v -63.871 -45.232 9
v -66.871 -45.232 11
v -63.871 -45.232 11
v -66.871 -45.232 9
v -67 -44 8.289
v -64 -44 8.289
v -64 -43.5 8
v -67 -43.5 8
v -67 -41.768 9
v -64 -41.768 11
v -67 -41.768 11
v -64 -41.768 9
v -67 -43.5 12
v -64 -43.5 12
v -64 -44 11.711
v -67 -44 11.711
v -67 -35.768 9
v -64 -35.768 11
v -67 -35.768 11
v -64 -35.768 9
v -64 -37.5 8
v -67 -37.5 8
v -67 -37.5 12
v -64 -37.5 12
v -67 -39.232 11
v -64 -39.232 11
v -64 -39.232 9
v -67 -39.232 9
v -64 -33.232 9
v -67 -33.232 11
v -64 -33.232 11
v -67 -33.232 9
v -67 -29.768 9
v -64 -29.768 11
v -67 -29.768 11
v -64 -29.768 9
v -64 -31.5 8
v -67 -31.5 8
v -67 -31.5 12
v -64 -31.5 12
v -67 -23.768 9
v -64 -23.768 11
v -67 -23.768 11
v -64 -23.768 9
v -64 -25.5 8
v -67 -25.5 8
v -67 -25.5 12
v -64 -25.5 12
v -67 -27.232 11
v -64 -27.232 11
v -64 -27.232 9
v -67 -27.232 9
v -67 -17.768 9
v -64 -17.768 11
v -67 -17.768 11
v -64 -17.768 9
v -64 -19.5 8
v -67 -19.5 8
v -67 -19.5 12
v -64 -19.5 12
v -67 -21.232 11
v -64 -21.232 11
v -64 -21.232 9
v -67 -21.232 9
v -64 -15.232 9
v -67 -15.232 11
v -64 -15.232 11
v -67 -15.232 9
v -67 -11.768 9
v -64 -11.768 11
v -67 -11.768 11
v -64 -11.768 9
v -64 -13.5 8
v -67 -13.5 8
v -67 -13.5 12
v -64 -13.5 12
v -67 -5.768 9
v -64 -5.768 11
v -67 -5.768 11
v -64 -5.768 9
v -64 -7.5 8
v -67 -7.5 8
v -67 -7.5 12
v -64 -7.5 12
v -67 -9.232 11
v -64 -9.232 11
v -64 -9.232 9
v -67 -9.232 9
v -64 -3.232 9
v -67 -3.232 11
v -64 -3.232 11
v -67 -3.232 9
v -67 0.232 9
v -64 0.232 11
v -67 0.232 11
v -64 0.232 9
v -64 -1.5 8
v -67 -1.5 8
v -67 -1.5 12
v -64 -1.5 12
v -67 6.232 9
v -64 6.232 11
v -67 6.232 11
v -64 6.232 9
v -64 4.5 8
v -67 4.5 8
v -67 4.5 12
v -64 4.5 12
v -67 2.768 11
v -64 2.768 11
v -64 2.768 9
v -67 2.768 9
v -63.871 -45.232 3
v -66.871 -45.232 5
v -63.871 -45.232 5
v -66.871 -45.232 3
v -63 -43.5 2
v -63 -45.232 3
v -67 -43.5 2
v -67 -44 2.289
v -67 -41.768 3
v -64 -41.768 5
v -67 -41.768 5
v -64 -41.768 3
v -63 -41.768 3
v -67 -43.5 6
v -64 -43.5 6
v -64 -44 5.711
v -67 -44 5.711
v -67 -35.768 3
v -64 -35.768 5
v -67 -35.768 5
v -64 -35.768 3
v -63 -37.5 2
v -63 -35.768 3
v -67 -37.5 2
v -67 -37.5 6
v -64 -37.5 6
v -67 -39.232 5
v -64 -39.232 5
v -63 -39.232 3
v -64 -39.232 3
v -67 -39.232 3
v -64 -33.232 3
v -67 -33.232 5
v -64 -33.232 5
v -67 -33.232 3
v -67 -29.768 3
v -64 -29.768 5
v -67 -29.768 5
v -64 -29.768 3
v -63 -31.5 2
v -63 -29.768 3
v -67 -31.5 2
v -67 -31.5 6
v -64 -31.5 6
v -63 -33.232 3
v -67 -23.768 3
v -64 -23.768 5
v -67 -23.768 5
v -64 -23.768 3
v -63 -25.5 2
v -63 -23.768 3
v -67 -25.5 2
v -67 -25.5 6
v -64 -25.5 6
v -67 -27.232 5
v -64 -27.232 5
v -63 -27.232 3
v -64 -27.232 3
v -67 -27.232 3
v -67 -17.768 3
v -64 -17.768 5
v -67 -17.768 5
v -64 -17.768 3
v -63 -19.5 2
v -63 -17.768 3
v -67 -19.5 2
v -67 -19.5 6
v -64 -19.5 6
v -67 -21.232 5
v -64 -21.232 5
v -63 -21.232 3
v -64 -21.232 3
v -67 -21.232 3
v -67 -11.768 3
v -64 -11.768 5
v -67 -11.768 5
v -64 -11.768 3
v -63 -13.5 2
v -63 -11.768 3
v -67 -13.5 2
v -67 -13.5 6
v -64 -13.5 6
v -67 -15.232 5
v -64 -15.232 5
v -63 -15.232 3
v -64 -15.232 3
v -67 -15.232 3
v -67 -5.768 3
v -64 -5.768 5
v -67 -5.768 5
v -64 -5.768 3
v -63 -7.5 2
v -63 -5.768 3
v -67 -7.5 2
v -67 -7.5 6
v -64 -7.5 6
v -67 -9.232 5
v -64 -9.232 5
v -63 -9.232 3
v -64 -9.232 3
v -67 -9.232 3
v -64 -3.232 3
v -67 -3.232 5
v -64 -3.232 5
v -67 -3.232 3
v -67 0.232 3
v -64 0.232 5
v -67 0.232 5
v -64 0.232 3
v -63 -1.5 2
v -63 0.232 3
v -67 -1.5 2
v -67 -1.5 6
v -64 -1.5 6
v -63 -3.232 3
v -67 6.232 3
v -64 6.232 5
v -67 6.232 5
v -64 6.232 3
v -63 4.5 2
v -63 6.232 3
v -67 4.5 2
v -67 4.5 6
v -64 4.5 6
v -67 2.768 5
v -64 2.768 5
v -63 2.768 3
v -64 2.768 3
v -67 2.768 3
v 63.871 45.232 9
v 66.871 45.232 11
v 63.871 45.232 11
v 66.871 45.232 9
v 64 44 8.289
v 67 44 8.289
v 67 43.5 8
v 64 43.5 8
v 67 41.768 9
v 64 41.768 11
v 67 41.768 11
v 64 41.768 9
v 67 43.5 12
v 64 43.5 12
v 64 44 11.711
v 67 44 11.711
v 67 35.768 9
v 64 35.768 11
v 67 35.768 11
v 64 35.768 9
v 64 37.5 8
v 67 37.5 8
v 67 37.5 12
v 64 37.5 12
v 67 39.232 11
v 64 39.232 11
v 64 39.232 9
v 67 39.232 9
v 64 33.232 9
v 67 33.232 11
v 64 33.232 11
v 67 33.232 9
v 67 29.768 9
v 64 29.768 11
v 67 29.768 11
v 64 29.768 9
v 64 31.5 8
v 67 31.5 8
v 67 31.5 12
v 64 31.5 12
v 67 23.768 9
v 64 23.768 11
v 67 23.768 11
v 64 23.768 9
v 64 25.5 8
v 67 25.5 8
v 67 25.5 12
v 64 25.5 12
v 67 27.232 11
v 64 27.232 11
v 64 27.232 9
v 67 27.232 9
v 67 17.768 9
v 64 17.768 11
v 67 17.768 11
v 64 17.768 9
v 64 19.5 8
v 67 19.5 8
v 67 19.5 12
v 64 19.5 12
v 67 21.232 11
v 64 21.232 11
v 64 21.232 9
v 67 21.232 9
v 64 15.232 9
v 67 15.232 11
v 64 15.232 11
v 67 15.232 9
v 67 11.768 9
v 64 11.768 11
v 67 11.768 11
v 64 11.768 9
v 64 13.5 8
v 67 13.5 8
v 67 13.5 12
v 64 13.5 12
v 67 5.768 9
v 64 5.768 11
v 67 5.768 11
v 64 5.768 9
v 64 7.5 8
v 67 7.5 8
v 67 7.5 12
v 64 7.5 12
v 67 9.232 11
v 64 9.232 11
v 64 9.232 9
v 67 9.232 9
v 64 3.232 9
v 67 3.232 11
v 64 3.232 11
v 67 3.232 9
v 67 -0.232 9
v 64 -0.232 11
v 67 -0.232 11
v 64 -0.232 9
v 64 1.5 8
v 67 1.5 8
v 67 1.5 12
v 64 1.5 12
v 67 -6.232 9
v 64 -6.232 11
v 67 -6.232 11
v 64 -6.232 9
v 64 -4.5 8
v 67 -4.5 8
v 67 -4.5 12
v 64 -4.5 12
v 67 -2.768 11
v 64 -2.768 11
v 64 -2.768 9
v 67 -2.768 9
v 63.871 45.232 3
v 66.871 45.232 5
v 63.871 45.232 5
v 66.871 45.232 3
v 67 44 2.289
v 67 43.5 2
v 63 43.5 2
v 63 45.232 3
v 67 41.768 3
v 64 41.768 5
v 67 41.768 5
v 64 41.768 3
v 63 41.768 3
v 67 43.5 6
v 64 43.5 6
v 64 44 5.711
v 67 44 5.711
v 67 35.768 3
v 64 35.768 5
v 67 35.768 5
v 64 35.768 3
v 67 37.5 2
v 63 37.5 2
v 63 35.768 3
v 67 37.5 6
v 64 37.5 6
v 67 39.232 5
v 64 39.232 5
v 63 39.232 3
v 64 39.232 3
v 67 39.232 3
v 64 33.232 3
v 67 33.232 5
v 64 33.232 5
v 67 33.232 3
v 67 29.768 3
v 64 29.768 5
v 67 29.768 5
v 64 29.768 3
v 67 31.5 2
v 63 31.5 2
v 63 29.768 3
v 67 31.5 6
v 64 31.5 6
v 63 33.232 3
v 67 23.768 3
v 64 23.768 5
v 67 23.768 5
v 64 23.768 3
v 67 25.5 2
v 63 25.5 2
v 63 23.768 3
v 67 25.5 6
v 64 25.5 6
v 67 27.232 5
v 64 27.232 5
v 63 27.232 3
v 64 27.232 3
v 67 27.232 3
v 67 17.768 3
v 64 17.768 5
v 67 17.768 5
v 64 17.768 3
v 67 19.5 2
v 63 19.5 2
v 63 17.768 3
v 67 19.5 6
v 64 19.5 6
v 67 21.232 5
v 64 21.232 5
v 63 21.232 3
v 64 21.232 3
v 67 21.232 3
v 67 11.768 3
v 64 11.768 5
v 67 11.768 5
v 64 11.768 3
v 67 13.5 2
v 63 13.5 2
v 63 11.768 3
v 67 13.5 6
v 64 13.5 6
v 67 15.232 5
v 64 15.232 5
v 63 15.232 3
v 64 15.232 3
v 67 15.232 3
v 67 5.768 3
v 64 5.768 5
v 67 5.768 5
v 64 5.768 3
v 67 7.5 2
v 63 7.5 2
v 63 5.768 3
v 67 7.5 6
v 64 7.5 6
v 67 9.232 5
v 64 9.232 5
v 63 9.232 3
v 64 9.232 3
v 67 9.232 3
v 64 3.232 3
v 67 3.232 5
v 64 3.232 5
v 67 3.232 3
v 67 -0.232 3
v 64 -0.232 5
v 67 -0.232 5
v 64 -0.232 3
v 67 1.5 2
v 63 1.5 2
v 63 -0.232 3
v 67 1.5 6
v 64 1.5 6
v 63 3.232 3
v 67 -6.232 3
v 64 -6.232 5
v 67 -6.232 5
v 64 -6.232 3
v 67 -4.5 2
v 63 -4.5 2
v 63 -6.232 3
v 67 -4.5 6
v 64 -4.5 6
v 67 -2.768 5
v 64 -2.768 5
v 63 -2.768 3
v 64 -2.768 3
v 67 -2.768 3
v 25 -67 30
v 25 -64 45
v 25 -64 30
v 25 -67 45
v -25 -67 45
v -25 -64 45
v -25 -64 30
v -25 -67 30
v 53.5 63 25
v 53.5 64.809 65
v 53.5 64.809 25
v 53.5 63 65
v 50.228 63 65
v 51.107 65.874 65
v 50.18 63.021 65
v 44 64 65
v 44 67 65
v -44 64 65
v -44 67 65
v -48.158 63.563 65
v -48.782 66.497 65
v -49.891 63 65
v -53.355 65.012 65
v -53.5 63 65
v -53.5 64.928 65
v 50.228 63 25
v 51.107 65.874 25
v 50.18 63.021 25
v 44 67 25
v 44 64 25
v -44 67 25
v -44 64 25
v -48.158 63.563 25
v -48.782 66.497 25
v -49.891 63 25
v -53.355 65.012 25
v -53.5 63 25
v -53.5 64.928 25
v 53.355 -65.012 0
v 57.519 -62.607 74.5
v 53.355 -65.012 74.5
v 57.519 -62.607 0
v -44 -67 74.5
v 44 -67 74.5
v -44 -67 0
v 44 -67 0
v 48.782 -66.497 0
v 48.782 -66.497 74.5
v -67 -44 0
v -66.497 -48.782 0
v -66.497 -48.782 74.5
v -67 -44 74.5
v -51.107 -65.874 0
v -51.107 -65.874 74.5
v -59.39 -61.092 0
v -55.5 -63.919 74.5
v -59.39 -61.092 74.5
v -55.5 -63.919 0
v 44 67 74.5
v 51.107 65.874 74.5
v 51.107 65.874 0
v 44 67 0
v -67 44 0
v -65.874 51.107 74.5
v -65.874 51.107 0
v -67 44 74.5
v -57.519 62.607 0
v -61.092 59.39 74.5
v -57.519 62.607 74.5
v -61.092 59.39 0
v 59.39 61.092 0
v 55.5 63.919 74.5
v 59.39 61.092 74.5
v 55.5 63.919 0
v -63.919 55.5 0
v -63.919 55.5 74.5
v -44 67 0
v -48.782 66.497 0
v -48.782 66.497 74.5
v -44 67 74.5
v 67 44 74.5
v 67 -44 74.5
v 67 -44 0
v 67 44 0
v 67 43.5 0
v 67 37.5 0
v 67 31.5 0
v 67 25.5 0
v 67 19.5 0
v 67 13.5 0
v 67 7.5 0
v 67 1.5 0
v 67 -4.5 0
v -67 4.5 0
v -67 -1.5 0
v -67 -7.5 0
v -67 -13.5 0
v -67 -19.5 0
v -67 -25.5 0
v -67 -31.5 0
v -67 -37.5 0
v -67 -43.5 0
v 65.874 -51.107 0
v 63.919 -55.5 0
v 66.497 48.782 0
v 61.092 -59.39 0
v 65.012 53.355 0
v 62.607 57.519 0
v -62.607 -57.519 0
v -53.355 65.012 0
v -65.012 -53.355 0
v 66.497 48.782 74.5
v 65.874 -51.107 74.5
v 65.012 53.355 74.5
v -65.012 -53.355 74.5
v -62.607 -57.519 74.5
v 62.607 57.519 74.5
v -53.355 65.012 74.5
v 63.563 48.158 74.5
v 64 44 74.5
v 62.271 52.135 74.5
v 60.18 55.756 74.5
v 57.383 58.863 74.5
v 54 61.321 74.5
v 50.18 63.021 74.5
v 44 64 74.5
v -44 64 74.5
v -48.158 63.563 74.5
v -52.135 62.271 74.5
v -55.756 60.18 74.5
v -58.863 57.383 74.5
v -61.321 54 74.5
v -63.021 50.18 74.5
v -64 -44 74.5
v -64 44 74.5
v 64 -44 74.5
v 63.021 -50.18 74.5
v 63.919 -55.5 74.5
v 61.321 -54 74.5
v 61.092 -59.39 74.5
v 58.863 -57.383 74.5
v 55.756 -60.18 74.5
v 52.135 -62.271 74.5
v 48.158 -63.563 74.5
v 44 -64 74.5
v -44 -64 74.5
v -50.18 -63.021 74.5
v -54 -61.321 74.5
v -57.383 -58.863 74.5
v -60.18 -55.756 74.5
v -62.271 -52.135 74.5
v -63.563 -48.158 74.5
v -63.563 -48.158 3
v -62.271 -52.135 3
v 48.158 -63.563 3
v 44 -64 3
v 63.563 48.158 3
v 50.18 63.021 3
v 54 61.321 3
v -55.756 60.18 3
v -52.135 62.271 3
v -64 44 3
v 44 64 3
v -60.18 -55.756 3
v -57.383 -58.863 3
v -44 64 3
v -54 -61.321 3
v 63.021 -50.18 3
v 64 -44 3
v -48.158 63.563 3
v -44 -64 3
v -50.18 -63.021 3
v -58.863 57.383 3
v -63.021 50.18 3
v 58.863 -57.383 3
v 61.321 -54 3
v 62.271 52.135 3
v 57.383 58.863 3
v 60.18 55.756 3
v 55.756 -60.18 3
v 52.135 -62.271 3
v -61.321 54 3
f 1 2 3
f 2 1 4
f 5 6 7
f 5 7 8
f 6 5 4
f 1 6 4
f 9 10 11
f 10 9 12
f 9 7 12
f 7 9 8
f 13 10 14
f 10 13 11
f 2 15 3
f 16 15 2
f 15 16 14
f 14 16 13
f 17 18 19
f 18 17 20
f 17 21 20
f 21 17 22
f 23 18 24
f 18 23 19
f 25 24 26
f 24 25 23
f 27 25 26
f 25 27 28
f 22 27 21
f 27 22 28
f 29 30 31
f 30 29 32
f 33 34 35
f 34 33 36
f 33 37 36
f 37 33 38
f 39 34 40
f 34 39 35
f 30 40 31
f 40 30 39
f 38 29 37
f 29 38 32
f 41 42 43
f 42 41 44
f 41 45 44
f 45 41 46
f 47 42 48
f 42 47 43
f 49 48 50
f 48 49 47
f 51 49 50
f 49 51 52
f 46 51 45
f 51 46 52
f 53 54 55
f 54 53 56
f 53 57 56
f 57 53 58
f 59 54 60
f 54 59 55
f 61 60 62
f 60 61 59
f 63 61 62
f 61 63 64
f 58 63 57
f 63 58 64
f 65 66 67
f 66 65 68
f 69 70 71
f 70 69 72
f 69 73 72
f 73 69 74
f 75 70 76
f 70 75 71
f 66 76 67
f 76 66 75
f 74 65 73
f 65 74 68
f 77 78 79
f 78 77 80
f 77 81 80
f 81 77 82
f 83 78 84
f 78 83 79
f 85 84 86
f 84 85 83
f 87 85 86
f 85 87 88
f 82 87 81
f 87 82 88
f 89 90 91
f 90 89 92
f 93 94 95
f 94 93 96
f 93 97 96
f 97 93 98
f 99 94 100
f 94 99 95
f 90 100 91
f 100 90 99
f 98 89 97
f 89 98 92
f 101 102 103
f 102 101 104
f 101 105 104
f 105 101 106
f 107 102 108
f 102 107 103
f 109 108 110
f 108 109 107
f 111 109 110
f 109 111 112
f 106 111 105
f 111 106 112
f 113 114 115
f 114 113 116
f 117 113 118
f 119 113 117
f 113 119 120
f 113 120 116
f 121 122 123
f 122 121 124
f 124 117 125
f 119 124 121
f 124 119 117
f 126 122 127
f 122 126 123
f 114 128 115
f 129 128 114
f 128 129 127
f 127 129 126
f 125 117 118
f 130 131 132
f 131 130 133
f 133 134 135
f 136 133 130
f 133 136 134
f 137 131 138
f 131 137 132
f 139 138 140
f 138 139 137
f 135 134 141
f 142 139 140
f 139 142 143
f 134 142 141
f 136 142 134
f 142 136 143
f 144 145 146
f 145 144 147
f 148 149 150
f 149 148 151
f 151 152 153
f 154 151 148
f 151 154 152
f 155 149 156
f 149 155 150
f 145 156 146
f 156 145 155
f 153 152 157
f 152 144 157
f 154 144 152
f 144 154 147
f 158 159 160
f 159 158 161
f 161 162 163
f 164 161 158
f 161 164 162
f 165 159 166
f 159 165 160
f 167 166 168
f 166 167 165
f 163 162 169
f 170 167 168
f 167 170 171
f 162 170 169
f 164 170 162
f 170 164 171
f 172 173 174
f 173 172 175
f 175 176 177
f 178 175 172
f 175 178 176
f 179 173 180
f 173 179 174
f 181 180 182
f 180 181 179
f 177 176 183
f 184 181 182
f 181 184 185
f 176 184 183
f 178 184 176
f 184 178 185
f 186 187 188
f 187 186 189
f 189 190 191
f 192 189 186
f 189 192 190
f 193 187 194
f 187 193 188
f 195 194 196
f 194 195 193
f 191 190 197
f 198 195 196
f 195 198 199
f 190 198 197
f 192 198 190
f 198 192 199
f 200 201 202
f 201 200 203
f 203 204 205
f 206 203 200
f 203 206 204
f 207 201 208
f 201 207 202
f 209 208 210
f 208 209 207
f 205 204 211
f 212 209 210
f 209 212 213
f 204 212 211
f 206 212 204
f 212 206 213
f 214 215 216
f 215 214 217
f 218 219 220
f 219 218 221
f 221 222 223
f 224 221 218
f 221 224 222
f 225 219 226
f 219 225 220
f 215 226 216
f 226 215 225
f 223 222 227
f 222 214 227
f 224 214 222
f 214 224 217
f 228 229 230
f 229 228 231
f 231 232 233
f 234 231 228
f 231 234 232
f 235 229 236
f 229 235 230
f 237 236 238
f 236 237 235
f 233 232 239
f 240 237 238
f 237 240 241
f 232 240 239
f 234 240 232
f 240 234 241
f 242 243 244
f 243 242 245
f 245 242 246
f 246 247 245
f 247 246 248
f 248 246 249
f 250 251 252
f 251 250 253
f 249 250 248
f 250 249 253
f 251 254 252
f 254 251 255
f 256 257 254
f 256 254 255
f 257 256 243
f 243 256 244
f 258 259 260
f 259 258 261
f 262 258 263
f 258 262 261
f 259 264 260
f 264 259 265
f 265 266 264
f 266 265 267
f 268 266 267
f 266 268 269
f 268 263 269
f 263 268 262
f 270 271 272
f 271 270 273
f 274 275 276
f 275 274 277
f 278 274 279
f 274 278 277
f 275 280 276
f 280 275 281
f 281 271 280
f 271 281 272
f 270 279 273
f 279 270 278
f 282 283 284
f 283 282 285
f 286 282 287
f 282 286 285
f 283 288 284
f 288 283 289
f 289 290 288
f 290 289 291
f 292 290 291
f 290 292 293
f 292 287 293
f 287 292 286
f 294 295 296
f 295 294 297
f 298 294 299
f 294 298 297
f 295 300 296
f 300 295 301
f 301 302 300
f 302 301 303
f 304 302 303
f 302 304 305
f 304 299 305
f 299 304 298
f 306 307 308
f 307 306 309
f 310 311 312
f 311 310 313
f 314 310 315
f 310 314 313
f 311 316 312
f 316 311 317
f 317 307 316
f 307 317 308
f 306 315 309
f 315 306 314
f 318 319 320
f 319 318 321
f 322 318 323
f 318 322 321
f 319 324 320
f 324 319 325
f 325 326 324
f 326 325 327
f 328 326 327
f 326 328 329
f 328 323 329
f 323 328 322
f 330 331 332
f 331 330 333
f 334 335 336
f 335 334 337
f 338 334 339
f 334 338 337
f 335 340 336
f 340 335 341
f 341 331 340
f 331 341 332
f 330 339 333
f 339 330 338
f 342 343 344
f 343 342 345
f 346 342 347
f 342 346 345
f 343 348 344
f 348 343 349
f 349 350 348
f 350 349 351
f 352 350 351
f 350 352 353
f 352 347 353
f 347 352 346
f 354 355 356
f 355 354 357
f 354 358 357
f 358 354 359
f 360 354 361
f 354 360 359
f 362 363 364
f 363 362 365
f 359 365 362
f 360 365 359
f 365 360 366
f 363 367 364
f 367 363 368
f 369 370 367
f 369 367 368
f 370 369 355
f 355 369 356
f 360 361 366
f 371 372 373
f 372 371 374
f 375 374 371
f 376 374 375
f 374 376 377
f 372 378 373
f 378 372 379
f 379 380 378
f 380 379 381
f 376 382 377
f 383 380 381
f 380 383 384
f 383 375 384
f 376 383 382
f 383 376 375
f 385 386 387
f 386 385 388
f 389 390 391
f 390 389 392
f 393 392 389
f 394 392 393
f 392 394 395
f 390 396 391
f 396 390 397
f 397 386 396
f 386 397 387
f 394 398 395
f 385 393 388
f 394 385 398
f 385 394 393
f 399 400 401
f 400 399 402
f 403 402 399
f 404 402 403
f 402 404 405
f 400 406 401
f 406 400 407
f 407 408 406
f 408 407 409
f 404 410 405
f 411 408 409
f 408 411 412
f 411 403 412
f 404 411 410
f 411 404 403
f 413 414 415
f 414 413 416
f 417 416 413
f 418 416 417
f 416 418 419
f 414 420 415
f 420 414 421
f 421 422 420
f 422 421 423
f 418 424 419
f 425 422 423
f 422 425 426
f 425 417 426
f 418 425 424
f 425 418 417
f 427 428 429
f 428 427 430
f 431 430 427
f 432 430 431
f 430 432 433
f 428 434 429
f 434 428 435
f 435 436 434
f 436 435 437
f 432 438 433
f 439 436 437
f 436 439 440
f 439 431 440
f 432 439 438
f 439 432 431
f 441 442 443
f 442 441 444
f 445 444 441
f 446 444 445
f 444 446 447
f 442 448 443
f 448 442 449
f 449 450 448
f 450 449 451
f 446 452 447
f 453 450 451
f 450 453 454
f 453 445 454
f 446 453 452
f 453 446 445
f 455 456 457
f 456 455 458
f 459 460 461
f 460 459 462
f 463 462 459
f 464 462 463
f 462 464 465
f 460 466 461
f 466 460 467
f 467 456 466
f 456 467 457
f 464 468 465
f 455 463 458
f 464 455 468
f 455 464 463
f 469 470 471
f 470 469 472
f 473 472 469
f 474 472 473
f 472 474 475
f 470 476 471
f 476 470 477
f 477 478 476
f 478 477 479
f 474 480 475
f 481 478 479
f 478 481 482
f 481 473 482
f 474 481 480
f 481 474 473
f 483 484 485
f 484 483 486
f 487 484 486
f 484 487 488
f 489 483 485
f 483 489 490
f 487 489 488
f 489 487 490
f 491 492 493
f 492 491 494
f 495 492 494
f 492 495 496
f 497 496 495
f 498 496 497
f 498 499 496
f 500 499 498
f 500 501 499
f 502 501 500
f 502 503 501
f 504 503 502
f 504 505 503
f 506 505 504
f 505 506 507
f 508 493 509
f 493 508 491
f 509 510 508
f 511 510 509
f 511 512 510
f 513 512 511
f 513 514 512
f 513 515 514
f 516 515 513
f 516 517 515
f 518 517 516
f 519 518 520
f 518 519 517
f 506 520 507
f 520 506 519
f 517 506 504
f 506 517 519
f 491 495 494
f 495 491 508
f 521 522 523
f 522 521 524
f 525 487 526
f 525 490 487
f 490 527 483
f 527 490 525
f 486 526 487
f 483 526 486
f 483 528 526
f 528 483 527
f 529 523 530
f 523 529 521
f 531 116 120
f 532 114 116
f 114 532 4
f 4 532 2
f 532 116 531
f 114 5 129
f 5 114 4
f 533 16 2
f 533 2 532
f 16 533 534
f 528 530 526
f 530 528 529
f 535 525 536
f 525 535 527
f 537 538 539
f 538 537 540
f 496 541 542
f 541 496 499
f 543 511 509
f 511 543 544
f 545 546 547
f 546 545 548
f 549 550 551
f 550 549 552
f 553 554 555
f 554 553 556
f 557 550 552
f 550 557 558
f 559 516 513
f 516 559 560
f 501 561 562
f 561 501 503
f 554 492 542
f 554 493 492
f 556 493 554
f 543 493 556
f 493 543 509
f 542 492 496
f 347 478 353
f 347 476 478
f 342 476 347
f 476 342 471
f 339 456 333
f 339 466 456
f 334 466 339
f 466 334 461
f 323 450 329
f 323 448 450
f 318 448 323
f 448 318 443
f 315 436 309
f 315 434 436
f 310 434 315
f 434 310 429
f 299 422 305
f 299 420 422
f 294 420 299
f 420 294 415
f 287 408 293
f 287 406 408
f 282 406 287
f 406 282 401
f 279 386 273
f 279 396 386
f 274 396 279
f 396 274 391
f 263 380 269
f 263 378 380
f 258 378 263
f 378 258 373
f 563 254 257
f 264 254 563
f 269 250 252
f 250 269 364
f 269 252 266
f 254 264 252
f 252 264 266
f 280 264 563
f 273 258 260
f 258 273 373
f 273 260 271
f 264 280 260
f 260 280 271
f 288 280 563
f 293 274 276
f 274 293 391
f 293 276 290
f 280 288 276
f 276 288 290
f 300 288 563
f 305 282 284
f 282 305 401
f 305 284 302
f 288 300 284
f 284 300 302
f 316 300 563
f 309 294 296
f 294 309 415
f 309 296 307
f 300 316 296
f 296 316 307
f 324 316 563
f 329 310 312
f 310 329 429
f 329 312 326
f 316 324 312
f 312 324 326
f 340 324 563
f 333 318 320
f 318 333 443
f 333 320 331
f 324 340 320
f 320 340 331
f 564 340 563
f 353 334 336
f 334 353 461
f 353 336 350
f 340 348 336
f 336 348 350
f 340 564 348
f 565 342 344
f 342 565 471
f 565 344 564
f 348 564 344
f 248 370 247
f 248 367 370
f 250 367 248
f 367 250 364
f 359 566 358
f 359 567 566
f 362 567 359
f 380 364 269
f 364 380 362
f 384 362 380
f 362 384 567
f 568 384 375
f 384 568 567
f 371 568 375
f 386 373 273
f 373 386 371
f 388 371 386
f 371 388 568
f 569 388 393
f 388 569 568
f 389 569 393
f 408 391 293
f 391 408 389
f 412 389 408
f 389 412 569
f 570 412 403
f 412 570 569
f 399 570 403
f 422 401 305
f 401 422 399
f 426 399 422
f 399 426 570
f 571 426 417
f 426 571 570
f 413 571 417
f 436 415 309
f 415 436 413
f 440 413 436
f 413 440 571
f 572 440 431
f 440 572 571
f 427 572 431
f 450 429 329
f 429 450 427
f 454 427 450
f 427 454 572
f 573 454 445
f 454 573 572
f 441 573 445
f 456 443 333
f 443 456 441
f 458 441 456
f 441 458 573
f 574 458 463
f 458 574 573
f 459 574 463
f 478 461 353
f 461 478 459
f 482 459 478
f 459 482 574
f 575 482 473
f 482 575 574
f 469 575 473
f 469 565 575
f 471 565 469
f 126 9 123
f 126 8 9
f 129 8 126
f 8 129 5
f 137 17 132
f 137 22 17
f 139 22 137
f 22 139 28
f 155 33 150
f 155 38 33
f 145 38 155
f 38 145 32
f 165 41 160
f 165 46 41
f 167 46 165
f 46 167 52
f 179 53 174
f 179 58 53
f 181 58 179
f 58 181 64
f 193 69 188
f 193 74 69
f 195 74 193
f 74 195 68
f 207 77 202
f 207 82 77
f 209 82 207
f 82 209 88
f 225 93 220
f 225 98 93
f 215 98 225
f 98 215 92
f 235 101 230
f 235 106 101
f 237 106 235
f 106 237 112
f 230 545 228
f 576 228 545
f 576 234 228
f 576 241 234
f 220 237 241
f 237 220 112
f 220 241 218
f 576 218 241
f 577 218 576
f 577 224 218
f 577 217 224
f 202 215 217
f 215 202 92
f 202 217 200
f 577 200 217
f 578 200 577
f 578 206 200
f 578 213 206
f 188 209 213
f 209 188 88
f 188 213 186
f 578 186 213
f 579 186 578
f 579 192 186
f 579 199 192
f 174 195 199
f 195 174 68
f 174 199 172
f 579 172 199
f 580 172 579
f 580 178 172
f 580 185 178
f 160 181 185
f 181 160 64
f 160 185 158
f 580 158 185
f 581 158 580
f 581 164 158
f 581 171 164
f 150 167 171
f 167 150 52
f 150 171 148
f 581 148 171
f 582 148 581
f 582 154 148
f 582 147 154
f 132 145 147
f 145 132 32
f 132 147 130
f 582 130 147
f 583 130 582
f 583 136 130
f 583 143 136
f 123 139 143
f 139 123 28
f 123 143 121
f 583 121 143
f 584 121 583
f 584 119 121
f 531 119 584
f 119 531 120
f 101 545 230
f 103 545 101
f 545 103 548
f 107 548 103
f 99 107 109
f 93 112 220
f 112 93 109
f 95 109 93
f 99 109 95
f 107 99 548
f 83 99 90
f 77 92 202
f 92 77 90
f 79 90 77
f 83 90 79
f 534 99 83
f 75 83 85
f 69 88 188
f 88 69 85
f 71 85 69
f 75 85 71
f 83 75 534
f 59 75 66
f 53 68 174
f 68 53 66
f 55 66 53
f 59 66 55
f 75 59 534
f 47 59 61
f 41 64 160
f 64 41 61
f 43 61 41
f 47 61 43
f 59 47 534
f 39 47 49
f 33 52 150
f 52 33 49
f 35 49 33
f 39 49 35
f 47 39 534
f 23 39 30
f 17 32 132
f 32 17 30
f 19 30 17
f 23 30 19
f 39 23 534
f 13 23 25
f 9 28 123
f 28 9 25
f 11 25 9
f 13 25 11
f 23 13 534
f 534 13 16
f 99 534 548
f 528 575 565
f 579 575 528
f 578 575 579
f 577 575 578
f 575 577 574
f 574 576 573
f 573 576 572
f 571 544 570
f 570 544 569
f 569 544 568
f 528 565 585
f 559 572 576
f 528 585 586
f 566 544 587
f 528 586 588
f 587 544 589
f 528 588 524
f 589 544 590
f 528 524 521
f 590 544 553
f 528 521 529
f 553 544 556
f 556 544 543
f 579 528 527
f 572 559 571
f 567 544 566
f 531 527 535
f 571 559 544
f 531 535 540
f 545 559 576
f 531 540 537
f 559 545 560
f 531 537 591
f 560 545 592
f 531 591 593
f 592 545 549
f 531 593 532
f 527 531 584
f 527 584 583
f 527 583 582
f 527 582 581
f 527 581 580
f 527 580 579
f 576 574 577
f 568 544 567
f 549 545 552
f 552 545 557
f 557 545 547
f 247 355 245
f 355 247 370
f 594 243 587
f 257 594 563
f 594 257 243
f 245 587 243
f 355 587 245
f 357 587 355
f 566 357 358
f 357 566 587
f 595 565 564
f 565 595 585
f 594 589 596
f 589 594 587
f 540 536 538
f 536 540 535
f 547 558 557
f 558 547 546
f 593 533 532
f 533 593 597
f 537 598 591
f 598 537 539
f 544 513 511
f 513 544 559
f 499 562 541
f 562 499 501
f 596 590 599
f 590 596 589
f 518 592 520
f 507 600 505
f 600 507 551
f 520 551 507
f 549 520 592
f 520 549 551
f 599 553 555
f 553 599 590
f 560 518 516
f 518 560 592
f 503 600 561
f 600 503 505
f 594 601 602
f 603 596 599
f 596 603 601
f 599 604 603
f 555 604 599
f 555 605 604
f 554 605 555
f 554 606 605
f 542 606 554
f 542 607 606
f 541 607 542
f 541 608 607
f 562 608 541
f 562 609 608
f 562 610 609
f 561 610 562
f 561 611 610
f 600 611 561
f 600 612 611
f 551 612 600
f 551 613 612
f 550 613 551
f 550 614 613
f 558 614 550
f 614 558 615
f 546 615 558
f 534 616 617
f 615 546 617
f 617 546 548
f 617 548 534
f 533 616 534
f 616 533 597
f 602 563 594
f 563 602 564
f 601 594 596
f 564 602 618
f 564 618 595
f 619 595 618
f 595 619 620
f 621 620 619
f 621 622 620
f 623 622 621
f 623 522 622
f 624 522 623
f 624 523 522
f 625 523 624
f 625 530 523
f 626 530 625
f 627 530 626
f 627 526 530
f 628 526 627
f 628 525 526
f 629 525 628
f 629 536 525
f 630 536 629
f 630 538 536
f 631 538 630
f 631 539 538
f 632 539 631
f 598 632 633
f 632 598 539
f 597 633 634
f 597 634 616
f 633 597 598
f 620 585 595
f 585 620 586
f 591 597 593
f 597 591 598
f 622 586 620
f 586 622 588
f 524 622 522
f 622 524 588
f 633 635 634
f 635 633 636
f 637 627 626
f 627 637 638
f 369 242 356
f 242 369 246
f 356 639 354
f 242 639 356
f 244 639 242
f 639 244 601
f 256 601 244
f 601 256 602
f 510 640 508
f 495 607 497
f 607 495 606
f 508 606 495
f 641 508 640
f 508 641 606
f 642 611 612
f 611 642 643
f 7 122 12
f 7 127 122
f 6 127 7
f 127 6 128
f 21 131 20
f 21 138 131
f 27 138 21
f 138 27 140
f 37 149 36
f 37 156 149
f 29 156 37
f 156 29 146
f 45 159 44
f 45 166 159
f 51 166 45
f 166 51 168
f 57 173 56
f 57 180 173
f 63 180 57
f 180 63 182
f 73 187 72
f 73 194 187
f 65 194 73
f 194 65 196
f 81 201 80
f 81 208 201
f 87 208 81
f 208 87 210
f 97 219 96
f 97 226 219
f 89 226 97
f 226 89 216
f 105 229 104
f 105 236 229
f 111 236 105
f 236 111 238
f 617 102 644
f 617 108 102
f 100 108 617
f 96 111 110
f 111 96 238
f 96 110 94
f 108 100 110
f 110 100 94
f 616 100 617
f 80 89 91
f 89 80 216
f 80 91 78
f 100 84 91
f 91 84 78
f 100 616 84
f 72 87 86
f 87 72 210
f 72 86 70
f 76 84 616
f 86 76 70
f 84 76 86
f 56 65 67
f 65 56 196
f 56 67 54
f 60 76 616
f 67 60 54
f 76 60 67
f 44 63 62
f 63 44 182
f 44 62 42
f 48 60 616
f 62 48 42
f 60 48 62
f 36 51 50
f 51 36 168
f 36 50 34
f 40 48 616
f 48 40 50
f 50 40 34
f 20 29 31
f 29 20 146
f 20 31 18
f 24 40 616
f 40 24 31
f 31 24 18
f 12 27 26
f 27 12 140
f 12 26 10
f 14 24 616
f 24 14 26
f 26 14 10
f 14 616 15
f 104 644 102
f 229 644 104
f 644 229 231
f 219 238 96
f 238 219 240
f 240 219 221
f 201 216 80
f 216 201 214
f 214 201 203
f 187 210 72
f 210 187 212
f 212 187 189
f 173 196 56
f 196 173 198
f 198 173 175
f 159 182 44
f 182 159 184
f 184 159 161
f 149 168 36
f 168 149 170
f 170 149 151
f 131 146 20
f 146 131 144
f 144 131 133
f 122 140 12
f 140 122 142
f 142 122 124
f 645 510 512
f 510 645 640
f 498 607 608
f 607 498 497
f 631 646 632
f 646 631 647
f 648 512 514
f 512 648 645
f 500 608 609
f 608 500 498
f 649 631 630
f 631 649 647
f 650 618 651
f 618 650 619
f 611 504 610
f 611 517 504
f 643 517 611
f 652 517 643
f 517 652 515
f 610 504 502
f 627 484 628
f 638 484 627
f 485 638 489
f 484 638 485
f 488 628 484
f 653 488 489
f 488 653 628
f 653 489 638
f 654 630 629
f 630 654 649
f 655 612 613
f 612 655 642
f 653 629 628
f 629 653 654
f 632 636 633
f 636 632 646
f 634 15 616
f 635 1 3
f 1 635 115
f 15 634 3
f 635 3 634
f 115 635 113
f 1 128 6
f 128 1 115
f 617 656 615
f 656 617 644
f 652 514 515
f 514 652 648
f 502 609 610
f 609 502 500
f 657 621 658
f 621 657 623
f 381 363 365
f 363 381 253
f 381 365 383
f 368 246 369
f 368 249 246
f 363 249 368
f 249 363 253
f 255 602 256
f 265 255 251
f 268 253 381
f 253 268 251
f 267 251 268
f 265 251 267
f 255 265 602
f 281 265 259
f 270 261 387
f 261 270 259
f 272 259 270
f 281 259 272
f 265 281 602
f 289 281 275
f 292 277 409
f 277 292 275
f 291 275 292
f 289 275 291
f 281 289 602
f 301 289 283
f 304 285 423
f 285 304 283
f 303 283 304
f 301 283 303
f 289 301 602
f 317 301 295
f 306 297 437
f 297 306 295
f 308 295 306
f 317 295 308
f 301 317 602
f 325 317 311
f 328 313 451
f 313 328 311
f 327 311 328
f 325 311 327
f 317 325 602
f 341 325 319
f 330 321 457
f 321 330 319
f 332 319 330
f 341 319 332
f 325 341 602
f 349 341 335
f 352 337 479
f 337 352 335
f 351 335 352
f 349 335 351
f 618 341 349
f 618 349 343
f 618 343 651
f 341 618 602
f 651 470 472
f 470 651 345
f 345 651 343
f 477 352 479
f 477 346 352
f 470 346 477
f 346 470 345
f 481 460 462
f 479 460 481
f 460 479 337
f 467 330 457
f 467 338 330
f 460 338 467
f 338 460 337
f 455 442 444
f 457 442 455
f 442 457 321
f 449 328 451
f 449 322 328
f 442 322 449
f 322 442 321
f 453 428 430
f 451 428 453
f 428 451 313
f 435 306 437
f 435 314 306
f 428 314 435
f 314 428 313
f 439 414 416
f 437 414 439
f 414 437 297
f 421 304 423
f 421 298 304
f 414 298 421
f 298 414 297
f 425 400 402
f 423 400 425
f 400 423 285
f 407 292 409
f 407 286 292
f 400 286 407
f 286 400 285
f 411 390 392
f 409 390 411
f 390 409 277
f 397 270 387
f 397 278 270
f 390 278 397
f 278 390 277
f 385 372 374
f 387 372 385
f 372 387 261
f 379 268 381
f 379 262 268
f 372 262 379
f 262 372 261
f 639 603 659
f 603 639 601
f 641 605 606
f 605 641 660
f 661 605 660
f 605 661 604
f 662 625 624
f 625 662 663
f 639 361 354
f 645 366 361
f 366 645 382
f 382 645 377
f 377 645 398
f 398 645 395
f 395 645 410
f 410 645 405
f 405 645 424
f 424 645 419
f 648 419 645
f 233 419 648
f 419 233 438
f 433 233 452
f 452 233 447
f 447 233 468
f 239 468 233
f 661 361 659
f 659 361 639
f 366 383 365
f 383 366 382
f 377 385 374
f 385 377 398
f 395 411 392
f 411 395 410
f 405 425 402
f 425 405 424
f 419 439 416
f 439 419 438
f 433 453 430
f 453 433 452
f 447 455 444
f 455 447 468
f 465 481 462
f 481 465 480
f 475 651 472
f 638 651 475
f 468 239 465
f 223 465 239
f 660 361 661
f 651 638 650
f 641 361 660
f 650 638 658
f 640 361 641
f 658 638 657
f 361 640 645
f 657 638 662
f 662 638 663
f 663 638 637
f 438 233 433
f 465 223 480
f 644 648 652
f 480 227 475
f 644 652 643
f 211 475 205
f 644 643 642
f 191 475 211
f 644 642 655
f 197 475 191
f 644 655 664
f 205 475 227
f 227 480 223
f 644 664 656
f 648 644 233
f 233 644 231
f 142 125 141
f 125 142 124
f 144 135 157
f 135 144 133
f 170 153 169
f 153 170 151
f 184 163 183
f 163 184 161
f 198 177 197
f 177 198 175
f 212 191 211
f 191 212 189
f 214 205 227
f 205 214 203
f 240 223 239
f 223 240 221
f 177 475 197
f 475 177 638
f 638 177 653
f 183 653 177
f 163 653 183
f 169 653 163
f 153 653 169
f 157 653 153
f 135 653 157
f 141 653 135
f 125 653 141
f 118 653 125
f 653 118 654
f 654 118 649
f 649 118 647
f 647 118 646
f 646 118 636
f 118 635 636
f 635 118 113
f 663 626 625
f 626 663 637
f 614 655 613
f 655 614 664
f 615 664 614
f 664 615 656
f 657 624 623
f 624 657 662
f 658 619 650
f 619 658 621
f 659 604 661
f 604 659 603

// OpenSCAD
/*
    MAC MINI M4 (2025) + MINISOPURO HUB ENCLOSURE
    Parametric 3D Printable Design
    
    Instructions:
    1. Open this file in OpenSCAD.
    2. Adjust 'tolerance' based on your printer's accuracy.
    3. Press F6 to Render and F7 to Export as STL.
*/

// --- PARAMETERS ---
// Mac Mini M4 Dimensions
mini_side = 127.0; 
mini_height = 50.0;
mini_radius = 20.0; // Corner radius (squircle approximation)

// Hub Dimensions (Minisopuro for M4)
hub_height = 20.0;

// Enclosure Settings
wall_thickness = 3.0;
tolerance = 0.5; // Gap between device and walls (friction fit)
grid_hole_size = 4.0;
grid_spacing = 6.0;

// Internal calculated dimensions
inner_w = mini_side + (tolerance * 2);
inner_h = mini_height + hub_height + (tolerance * 3);
outer_w = inner_w + (wall_thickness * 2);
outer_h = inner_h + wall_thickness;

// --- MODULES ---

module rounded_box(w, h, r, height) {
    linear_extrude(height)
    offset(r = r)
    square([w - 2*r, w - 2*r], center = true);
}

module side_ventilation_grid() {
    grid_w = mini_side - 40;
    grid_h = inner_h - 20;
    
    translate([-outer_w/2 - 1, -grid_w/2, 10])
    rotate([0, 90, 0])
    for (x = [0 : grid_spacing : grid_w]) {
        for (y = [0 : grid_spacing : grid_h]) {
            translate([x, y, 0])
            cylinder(d = grid_hole_size, h = wall_thickness + 2, $fn = 6);
        }
    }
}

module port_cutouts() {
    // FRONT: Mac Mini M4 (USB-C & Jack)
    // Centered horizontally, M4 ports are roughly at the bottom of the unit
    translate([-25, -outer_w/2 - 1, 30])
    cube([50, wall_thickness + 2, 15]); // Front generic I/O slot
    
    // REAR: Main Ports
    translate([-mini_side/2 + 10, outer_w/2 - wall_thickness - 1, 25])
    cube([mini_side - 20, wall_thickness + 2, 40]);
}

// --- FINAL ASSEMBLY ---

difference() {
    // 1. Outer Shell
    rounded_box(outer_w, outer_h, mini_radius + wall_thickness, outer_h);
    
    // 2. Inner Hollow Space
    translate([0, 0, wall_thickness])
    rounded_box(inner_w, inner_h, mini_radius, inner_h + 1);
    
    // 3. Top Opening (ensure it's a stackable sleeve)
    translate([0, 0, outer_h - 0.1])
    rounded_box(inner_w, inner_h, mini_radius, 1);

    // 4. Side Grids
    side_ventilation_grid(); // Left side
    rotate([0, 0, 180]) side_ventilation_grid(); // Right side
    
    // 5. Ports
    port_cutouts();
}

// Optional: Visual aids (uncomment to see device mockup)
// %translate([0,0,wall_thickness + tolerance]) rounded_box(mini_side, mini_height, mini_radius, mini_height); // Mac Mini
// %translate([0,0,wall_thickness]) rounded_box(mini_side, hub_height, mini_radius, hub_height); // Hub
